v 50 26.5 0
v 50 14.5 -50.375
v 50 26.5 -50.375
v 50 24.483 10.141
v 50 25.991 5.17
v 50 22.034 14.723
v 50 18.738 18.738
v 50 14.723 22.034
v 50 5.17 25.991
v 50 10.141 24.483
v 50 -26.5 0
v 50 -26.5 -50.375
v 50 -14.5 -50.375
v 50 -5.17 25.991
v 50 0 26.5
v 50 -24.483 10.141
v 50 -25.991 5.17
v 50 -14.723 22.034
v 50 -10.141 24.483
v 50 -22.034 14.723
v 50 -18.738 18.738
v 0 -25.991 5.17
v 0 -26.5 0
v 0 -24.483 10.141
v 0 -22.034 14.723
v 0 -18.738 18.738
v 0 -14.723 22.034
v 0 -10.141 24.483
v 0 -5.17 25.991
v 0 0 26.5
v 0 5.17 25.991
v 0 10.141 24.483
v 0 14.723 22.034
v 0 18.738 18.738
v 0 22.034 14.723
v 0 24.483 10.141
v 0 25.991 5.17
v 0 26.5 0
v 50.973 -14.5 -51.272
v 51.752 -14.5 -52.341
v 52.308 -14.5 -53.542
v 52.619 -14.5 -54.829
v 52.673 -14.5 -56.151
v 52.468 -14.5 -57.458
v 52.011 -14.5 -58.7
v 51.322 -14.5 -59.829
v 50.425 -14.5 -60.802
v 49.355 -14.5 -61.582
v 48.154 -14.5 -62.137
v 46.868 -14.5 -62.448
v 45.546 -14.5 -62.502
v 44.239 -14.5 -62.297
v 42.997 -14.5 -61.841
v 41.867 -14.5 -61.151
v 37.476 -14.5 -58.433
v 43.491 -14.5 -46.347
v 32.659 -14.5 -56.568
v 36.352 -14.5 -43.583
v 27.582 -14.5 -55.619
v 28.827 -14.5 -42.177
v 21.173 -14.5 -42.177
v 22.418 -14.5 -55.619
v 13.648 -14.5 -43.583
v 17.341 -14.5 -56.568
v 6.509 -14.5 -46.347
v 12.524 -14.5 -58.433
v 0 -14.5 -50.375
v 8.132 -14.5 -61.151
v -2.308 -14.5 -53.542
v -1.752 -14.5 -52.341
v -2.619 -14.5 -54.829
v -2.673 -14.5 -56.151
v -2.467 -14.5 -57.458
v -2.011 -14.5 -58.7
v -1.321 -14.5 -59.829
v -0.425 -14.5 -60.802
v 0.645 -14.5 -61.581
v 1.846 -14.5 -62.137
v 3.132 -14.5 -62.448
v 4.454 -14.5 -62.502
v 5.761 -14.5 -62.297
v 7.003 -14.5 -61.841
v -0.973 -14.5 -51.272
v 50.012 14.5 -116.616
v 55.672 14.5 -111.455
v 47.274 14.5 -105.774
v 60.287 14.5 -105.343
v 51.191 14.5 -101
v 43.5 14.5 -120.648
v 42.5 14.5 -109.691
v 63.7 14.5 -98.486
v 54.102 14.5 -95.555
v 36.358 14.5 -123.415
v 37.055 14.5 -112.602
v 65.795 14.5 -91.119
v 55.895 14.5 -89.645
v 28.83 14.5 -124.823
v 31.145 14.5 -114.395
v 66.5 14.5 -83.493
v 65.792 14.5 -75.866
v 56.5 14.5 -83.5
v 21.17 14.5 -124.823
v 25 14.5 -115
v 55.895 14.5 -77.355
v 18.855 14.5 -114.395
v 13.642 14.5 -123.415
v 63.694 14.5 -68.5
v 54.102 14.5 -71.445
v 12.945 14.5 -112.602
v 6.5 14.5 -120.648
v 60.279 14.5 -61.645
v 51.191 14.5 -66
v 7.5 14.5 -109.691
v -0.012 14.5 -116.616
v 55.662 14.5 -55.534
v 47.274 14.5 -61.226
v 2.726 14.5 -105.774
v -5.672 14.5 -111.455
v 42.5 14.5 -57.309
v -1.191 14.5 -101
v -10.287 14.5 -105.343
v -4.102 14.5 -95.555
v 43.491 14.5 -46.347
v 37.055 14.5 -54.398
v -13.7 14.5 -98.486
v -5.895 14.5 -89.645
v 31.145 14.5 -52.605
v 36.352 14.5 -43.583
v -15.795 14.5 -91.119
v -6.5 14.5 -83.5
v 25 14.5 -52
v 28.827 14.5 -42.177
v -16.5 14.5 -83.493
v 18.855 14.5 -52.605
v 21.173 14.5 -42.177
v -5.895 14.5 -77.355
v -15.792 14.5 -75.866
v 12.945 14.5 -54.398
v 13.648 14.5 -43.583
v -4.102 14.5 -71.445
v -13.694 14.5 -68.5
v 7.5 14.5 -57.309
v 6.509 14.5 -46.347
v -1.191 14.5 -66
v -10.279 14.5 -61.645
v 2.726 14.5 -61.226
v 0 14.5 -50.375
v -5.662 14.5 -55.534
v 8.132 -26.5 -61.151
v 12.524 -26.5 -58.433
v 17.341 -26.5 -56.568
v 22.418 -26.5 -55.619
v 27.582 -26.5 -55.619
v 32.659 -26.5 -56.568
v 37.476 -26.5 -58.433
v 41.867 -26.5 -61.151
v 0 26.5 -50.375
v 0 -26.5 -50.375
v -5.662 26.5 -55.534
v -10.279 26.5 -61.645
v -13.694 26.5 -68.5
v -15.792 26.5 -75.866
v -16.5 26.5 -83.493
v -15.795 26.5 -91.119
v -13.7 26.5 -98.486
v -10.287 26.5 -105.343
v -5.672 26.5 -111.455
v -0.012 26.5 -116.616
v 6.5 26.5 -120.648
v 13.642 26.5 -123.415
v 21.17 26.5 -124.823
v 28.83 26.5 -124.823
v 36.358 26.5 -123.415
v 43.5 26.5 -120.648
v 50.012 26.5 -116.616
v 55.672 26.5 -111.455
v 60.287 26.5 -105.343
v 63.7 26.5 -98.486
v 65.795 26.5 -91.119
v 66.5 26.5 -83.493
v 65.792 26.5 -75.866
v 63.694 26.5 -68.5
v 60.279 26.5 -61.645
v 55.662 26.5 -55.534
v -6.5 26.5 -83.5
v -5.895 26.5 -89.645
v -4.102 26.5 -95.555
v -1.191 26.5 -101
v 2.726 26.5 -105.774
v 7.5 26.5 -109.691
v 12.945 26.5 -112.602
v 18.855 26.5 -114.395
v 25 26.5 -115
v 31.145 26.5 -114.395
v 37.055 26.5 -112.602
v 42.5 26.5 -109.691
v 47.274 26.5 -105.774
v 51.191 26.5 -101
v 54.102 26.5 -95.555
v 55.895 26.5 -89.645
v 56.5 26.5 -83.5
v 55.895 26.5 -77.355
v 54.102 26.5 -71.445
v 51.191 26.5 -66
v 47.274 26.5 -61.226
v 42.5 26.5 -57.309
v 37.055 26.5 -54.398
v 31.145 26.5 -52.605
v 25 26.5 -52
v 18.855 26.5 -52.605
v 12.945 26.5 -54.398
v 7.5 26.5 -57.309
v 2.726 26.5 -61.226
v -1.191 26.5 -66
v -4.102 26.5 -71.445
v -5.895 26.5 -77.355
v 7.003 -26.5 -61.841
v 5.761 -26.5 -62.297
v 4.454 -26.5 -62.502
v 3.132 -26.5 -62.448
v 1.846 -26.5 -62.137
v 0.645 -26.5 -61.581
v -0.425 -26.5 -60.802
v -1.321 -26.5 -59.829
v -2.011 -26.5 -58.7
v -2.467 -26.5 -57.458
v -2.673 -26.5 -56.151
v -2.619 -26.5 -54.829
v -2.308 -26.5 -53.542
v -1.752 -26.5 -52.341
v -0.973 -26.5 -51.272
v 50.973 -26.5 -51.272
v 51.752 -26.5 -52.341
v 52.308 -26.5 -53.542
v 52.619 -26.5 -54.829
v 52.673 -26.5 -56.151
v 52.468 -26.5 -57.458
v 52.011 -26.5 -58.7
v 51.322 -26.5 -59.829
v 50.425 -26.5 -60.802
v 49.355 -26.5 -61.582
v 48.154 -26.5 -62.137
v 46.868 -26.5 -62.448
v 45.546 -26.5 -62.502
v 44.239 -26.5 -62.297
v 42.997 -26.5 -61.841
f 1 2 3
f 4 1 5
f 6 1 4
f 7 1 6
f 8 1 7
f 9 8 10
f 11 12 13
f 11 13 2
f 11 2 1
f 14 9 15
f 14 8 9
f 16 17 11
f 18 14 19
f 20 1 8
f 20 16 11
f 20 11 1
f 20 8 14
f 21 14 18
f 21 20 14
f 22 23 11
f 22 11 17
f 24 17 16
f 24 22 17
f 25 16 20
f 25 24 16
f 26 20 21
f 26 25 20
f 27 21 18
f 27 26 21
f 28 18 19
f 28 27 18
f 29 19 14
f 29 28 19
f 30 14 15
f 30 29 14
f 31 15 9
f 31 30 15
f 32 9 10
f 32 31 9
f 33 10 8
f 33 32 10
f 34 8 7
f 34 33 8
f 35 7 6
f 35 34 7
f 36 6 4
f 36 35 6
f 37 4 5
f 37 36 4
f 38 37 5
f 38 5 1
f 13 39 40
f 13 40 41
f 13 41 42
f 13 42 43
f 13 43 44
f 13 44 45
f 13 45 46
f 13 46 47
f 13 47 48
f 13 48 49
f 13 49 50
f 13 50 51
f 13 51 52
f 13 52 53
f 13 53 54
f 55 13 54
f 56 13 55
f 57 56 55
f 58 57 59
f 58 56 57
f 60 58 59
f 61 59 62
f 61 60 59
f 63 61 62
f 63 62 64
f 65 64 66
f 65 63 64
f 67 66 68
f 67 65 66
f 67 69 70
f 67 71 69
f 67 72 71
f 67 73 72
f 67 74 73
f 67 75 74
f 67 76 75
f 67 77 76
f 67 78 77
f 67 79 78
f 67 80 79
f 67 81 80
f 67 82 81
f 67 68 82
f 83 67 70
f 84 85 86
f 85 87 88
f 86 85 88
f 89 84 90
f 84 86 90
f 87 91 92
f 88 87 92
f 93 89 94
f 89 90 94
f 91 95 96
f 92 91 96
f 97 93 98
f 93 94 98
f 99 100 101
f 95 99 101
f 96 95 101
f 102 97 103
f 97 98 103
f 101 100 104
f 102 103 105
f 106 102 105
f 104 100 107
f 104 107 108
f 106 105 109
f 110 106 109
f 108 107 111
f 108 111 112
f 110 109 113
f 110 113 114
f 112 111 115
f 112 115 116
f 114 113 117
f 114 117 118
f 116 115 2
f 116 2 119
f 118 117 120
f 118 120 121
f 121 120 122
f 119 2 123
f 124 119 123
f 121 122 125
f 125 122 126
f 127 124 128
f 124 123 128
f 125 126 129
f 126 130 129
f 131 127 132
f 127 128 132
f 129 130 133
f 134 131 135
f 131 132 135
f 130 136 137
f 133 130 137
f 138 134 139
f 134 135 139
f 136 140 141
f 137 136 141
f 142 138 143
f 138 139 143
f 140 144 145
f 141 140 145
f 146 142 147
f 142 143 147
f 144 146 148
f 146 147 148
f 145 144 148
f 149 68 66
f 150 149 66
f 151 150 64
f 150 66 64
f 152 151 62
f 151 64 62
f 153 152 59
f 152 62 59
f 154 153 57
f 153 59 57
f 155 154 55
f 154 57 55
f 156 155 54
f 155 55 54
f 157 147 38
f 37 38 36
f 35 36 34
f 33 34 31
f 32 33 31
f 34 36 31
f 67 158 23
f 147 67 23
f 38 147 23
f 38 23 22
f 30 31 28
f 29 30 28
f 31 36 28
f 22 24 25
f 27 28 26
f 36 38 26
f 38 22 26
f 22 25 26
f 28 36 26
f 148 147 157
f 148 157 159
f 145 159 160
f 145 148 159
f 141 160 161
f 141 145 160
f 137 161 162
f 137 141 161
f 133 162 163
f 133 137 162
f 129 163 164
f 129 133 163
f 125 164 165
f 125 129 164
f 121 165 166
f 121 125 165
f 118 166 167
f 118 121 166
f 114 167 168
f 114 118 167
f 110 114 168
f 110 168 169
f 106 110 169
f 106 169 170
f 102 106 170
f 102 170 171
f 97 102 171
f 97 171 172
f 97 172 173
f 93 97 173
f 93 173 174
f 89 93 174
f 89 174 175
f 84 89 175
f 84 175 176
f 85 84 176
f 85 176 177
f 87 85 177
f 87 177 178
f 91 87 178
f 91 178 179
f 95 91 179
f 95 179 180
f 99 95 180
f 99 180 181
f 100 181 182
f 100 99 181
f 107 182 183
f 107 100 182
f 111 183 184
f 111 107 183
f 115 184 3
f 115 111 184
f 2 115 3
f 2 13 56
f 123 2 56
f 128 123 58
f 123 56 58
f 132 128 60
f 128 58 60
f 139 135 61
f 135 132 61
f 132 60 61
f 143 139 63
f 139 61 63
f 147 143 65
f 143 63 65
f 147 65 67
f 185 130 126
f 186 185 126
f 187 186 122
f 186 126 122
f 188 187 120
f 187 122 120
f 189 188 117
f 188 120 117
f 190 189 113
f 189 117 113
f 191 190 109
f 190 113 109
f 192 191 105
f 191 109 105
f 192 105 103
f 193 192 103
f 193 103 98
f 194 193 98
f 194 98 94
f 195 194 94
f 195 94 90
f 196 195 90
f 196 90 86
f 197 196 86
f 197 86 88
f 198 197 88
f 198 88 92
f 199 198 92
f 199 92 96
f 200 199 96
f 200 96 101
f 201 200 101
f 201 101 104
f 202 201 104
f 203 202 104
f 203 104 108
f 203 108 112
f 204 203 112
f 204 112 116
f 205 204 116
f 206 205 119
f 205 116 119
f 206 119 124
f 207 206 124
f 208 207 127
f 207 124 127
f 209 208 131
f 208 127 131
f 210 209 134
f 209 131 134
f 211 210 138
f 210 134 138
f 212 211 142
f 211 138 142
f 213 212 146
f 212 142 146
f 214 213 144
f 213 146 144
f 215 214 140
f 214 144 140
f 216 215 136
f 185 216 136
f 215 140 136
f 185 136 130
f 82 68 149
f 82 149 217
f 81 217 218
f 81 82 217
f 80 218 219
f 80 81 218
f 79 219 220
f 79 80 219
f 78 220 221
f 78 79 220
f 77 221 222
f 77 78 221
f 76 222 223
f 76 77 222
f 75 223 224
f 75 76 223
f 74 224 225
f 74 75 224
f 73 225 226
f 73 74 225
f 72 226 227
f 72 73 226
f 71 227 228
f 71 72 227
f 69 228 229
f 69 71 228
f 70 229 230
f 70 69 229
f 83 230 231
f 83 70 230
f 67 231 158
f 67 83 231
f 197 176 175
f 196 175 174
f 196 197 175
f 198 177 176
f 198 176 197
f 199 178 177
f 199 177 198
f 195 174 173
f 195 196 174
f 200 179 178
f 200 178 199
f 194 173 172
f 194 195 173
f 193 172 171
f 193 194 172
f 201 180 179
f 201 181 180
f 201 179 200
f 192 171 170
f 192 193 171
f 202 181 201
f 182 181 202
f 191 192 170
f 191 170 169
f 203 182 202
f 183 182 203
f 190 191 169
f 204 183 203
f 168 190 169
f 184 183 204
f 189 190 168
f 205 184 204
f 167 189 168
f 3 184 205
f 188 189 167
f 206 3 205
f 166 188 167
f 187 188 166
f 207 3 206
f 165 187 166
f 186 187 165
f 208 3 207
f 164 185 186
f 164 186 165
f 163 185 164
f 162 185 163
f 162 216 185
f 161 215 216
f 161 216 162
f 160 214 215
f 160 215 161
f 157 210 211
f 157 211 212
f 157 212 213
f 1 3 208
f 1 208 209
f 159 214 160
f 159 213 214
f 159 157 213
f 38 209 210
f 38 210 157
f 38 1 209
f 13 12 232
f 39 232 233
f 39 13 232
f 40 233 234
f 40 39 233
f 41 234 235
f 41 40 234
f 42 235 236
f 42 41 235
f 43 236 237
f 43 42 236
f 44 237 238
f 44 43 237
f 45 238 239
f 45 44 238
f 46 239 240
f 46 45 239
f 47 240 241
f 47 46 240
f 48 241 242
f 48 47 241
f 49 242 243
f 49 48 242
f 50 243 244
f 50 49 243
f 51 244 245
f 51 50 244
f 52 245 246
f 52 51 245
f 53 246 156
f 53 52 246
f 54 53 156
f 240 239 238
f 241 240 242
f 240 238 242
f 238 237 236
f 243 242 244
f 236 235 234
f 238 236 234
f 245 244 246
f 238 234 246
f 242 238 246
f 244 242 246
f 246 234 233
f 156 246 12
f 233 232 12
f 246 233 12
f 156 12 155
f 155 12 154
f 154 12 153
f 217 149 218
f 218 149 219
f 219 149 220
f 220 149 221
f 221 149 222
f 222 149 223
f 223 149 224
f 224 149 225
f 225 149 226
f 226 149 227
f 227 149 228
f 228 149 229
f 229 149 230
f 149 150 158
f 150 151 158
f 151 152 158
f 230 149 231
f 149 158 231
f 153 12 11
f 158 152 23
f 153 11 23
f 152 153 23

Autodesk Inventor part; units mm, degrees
ref_plane "YZ Plane" through (0, 0, 0) normal (1, 0, 0) x (0, 1, 0)
sketch "Sketch2" plane through (0, 0, 0) normal (0, 1, 0) x (-1, 0, 0)
  circle A0 centre (-25, -83.5) radius 36 construction
  line L0 (-25, -83.5) -> (-61, -83.5) construction
  line L1 (-25, -83.5) -> (4.6941, -63.1466) construction
  circle A1 centre (-25, -83.5) radius 41.5
  circle A2 centre (-25, -83.5) radius 28
  arc A3 (-8.1325, -61.1508) -> (0, -50.3752) centre (-4.0663, -55.763) ccw
  arc A4 (-50, -50.3752) -> (-39.3017, -57.0193) centre (-45.9337, -55.763) ccw
  line L2 (-25, -83.5) -> (-4.0663, -55.763) construction
  circle A5 centre (-25, -83.5) radius 31.5
  line L3 (0, -50.3752) -> (0, 0)
  line L4 (-50, -50.3752) -> (-50, 0)
  line L5 (0, 0) -> (-50, 0)
  line L6 (-25, 0) -> (-25, -83.5) construction
  point P0 (15.9829, -76.969)
  point P1 (13.8342, -68.866)
  point P2 (-39.2078, -55.1936)
  point P3 (-41.8675, -61.1508)
  point P4 (-8.1325, -61.1508)
  dimension "d1" = 72
  dimension "d5" = 83
  dimension "d6" = 56
  dimension "d7" = 63
  dimension "d11" = 50
  dimension "d31" = 83.5
ref_plane "Work Plane1" through (0, -14.5, 0) normal (0, 1, 0) x (-1, 0, 0)
ref_plane "Work Plane2" through (0, 14.5, 0) normal (0, 1, 0) x (-1, 0, 0)
extrude "Extrusion1" add sketch "Sketch2" along normal blind 12 from surface at 14.5 contours A1 A4 A5 A3 | A3 A5 A4 A1
extrude "Extrusion2" add sketch "Sketch2" against normal blind 12 from surface at -14.5 contours A3 A5 A4 A1 | A3 A2 A4 A5 picked at (-44.9519, -51.1635) picked at (-38.3765, -56.444)
extrude "Extrusion3" add sketch "Sketch2" along normal mid plane 53 contours A1 L4 L5 L3
sketch "Sketch3" plane through (0, 0, 0) normal (1, 0, 0) x (0, 1, 0)
  line L0 (26.5, 0) -> (-26.5, 0) projected
  circle A0 centre (0, 0) radius 26.5
extrude "Extrusion4" add sketch "Sketch3" along normal up to surface (50 mm away)
properties part number "left_thigh"
